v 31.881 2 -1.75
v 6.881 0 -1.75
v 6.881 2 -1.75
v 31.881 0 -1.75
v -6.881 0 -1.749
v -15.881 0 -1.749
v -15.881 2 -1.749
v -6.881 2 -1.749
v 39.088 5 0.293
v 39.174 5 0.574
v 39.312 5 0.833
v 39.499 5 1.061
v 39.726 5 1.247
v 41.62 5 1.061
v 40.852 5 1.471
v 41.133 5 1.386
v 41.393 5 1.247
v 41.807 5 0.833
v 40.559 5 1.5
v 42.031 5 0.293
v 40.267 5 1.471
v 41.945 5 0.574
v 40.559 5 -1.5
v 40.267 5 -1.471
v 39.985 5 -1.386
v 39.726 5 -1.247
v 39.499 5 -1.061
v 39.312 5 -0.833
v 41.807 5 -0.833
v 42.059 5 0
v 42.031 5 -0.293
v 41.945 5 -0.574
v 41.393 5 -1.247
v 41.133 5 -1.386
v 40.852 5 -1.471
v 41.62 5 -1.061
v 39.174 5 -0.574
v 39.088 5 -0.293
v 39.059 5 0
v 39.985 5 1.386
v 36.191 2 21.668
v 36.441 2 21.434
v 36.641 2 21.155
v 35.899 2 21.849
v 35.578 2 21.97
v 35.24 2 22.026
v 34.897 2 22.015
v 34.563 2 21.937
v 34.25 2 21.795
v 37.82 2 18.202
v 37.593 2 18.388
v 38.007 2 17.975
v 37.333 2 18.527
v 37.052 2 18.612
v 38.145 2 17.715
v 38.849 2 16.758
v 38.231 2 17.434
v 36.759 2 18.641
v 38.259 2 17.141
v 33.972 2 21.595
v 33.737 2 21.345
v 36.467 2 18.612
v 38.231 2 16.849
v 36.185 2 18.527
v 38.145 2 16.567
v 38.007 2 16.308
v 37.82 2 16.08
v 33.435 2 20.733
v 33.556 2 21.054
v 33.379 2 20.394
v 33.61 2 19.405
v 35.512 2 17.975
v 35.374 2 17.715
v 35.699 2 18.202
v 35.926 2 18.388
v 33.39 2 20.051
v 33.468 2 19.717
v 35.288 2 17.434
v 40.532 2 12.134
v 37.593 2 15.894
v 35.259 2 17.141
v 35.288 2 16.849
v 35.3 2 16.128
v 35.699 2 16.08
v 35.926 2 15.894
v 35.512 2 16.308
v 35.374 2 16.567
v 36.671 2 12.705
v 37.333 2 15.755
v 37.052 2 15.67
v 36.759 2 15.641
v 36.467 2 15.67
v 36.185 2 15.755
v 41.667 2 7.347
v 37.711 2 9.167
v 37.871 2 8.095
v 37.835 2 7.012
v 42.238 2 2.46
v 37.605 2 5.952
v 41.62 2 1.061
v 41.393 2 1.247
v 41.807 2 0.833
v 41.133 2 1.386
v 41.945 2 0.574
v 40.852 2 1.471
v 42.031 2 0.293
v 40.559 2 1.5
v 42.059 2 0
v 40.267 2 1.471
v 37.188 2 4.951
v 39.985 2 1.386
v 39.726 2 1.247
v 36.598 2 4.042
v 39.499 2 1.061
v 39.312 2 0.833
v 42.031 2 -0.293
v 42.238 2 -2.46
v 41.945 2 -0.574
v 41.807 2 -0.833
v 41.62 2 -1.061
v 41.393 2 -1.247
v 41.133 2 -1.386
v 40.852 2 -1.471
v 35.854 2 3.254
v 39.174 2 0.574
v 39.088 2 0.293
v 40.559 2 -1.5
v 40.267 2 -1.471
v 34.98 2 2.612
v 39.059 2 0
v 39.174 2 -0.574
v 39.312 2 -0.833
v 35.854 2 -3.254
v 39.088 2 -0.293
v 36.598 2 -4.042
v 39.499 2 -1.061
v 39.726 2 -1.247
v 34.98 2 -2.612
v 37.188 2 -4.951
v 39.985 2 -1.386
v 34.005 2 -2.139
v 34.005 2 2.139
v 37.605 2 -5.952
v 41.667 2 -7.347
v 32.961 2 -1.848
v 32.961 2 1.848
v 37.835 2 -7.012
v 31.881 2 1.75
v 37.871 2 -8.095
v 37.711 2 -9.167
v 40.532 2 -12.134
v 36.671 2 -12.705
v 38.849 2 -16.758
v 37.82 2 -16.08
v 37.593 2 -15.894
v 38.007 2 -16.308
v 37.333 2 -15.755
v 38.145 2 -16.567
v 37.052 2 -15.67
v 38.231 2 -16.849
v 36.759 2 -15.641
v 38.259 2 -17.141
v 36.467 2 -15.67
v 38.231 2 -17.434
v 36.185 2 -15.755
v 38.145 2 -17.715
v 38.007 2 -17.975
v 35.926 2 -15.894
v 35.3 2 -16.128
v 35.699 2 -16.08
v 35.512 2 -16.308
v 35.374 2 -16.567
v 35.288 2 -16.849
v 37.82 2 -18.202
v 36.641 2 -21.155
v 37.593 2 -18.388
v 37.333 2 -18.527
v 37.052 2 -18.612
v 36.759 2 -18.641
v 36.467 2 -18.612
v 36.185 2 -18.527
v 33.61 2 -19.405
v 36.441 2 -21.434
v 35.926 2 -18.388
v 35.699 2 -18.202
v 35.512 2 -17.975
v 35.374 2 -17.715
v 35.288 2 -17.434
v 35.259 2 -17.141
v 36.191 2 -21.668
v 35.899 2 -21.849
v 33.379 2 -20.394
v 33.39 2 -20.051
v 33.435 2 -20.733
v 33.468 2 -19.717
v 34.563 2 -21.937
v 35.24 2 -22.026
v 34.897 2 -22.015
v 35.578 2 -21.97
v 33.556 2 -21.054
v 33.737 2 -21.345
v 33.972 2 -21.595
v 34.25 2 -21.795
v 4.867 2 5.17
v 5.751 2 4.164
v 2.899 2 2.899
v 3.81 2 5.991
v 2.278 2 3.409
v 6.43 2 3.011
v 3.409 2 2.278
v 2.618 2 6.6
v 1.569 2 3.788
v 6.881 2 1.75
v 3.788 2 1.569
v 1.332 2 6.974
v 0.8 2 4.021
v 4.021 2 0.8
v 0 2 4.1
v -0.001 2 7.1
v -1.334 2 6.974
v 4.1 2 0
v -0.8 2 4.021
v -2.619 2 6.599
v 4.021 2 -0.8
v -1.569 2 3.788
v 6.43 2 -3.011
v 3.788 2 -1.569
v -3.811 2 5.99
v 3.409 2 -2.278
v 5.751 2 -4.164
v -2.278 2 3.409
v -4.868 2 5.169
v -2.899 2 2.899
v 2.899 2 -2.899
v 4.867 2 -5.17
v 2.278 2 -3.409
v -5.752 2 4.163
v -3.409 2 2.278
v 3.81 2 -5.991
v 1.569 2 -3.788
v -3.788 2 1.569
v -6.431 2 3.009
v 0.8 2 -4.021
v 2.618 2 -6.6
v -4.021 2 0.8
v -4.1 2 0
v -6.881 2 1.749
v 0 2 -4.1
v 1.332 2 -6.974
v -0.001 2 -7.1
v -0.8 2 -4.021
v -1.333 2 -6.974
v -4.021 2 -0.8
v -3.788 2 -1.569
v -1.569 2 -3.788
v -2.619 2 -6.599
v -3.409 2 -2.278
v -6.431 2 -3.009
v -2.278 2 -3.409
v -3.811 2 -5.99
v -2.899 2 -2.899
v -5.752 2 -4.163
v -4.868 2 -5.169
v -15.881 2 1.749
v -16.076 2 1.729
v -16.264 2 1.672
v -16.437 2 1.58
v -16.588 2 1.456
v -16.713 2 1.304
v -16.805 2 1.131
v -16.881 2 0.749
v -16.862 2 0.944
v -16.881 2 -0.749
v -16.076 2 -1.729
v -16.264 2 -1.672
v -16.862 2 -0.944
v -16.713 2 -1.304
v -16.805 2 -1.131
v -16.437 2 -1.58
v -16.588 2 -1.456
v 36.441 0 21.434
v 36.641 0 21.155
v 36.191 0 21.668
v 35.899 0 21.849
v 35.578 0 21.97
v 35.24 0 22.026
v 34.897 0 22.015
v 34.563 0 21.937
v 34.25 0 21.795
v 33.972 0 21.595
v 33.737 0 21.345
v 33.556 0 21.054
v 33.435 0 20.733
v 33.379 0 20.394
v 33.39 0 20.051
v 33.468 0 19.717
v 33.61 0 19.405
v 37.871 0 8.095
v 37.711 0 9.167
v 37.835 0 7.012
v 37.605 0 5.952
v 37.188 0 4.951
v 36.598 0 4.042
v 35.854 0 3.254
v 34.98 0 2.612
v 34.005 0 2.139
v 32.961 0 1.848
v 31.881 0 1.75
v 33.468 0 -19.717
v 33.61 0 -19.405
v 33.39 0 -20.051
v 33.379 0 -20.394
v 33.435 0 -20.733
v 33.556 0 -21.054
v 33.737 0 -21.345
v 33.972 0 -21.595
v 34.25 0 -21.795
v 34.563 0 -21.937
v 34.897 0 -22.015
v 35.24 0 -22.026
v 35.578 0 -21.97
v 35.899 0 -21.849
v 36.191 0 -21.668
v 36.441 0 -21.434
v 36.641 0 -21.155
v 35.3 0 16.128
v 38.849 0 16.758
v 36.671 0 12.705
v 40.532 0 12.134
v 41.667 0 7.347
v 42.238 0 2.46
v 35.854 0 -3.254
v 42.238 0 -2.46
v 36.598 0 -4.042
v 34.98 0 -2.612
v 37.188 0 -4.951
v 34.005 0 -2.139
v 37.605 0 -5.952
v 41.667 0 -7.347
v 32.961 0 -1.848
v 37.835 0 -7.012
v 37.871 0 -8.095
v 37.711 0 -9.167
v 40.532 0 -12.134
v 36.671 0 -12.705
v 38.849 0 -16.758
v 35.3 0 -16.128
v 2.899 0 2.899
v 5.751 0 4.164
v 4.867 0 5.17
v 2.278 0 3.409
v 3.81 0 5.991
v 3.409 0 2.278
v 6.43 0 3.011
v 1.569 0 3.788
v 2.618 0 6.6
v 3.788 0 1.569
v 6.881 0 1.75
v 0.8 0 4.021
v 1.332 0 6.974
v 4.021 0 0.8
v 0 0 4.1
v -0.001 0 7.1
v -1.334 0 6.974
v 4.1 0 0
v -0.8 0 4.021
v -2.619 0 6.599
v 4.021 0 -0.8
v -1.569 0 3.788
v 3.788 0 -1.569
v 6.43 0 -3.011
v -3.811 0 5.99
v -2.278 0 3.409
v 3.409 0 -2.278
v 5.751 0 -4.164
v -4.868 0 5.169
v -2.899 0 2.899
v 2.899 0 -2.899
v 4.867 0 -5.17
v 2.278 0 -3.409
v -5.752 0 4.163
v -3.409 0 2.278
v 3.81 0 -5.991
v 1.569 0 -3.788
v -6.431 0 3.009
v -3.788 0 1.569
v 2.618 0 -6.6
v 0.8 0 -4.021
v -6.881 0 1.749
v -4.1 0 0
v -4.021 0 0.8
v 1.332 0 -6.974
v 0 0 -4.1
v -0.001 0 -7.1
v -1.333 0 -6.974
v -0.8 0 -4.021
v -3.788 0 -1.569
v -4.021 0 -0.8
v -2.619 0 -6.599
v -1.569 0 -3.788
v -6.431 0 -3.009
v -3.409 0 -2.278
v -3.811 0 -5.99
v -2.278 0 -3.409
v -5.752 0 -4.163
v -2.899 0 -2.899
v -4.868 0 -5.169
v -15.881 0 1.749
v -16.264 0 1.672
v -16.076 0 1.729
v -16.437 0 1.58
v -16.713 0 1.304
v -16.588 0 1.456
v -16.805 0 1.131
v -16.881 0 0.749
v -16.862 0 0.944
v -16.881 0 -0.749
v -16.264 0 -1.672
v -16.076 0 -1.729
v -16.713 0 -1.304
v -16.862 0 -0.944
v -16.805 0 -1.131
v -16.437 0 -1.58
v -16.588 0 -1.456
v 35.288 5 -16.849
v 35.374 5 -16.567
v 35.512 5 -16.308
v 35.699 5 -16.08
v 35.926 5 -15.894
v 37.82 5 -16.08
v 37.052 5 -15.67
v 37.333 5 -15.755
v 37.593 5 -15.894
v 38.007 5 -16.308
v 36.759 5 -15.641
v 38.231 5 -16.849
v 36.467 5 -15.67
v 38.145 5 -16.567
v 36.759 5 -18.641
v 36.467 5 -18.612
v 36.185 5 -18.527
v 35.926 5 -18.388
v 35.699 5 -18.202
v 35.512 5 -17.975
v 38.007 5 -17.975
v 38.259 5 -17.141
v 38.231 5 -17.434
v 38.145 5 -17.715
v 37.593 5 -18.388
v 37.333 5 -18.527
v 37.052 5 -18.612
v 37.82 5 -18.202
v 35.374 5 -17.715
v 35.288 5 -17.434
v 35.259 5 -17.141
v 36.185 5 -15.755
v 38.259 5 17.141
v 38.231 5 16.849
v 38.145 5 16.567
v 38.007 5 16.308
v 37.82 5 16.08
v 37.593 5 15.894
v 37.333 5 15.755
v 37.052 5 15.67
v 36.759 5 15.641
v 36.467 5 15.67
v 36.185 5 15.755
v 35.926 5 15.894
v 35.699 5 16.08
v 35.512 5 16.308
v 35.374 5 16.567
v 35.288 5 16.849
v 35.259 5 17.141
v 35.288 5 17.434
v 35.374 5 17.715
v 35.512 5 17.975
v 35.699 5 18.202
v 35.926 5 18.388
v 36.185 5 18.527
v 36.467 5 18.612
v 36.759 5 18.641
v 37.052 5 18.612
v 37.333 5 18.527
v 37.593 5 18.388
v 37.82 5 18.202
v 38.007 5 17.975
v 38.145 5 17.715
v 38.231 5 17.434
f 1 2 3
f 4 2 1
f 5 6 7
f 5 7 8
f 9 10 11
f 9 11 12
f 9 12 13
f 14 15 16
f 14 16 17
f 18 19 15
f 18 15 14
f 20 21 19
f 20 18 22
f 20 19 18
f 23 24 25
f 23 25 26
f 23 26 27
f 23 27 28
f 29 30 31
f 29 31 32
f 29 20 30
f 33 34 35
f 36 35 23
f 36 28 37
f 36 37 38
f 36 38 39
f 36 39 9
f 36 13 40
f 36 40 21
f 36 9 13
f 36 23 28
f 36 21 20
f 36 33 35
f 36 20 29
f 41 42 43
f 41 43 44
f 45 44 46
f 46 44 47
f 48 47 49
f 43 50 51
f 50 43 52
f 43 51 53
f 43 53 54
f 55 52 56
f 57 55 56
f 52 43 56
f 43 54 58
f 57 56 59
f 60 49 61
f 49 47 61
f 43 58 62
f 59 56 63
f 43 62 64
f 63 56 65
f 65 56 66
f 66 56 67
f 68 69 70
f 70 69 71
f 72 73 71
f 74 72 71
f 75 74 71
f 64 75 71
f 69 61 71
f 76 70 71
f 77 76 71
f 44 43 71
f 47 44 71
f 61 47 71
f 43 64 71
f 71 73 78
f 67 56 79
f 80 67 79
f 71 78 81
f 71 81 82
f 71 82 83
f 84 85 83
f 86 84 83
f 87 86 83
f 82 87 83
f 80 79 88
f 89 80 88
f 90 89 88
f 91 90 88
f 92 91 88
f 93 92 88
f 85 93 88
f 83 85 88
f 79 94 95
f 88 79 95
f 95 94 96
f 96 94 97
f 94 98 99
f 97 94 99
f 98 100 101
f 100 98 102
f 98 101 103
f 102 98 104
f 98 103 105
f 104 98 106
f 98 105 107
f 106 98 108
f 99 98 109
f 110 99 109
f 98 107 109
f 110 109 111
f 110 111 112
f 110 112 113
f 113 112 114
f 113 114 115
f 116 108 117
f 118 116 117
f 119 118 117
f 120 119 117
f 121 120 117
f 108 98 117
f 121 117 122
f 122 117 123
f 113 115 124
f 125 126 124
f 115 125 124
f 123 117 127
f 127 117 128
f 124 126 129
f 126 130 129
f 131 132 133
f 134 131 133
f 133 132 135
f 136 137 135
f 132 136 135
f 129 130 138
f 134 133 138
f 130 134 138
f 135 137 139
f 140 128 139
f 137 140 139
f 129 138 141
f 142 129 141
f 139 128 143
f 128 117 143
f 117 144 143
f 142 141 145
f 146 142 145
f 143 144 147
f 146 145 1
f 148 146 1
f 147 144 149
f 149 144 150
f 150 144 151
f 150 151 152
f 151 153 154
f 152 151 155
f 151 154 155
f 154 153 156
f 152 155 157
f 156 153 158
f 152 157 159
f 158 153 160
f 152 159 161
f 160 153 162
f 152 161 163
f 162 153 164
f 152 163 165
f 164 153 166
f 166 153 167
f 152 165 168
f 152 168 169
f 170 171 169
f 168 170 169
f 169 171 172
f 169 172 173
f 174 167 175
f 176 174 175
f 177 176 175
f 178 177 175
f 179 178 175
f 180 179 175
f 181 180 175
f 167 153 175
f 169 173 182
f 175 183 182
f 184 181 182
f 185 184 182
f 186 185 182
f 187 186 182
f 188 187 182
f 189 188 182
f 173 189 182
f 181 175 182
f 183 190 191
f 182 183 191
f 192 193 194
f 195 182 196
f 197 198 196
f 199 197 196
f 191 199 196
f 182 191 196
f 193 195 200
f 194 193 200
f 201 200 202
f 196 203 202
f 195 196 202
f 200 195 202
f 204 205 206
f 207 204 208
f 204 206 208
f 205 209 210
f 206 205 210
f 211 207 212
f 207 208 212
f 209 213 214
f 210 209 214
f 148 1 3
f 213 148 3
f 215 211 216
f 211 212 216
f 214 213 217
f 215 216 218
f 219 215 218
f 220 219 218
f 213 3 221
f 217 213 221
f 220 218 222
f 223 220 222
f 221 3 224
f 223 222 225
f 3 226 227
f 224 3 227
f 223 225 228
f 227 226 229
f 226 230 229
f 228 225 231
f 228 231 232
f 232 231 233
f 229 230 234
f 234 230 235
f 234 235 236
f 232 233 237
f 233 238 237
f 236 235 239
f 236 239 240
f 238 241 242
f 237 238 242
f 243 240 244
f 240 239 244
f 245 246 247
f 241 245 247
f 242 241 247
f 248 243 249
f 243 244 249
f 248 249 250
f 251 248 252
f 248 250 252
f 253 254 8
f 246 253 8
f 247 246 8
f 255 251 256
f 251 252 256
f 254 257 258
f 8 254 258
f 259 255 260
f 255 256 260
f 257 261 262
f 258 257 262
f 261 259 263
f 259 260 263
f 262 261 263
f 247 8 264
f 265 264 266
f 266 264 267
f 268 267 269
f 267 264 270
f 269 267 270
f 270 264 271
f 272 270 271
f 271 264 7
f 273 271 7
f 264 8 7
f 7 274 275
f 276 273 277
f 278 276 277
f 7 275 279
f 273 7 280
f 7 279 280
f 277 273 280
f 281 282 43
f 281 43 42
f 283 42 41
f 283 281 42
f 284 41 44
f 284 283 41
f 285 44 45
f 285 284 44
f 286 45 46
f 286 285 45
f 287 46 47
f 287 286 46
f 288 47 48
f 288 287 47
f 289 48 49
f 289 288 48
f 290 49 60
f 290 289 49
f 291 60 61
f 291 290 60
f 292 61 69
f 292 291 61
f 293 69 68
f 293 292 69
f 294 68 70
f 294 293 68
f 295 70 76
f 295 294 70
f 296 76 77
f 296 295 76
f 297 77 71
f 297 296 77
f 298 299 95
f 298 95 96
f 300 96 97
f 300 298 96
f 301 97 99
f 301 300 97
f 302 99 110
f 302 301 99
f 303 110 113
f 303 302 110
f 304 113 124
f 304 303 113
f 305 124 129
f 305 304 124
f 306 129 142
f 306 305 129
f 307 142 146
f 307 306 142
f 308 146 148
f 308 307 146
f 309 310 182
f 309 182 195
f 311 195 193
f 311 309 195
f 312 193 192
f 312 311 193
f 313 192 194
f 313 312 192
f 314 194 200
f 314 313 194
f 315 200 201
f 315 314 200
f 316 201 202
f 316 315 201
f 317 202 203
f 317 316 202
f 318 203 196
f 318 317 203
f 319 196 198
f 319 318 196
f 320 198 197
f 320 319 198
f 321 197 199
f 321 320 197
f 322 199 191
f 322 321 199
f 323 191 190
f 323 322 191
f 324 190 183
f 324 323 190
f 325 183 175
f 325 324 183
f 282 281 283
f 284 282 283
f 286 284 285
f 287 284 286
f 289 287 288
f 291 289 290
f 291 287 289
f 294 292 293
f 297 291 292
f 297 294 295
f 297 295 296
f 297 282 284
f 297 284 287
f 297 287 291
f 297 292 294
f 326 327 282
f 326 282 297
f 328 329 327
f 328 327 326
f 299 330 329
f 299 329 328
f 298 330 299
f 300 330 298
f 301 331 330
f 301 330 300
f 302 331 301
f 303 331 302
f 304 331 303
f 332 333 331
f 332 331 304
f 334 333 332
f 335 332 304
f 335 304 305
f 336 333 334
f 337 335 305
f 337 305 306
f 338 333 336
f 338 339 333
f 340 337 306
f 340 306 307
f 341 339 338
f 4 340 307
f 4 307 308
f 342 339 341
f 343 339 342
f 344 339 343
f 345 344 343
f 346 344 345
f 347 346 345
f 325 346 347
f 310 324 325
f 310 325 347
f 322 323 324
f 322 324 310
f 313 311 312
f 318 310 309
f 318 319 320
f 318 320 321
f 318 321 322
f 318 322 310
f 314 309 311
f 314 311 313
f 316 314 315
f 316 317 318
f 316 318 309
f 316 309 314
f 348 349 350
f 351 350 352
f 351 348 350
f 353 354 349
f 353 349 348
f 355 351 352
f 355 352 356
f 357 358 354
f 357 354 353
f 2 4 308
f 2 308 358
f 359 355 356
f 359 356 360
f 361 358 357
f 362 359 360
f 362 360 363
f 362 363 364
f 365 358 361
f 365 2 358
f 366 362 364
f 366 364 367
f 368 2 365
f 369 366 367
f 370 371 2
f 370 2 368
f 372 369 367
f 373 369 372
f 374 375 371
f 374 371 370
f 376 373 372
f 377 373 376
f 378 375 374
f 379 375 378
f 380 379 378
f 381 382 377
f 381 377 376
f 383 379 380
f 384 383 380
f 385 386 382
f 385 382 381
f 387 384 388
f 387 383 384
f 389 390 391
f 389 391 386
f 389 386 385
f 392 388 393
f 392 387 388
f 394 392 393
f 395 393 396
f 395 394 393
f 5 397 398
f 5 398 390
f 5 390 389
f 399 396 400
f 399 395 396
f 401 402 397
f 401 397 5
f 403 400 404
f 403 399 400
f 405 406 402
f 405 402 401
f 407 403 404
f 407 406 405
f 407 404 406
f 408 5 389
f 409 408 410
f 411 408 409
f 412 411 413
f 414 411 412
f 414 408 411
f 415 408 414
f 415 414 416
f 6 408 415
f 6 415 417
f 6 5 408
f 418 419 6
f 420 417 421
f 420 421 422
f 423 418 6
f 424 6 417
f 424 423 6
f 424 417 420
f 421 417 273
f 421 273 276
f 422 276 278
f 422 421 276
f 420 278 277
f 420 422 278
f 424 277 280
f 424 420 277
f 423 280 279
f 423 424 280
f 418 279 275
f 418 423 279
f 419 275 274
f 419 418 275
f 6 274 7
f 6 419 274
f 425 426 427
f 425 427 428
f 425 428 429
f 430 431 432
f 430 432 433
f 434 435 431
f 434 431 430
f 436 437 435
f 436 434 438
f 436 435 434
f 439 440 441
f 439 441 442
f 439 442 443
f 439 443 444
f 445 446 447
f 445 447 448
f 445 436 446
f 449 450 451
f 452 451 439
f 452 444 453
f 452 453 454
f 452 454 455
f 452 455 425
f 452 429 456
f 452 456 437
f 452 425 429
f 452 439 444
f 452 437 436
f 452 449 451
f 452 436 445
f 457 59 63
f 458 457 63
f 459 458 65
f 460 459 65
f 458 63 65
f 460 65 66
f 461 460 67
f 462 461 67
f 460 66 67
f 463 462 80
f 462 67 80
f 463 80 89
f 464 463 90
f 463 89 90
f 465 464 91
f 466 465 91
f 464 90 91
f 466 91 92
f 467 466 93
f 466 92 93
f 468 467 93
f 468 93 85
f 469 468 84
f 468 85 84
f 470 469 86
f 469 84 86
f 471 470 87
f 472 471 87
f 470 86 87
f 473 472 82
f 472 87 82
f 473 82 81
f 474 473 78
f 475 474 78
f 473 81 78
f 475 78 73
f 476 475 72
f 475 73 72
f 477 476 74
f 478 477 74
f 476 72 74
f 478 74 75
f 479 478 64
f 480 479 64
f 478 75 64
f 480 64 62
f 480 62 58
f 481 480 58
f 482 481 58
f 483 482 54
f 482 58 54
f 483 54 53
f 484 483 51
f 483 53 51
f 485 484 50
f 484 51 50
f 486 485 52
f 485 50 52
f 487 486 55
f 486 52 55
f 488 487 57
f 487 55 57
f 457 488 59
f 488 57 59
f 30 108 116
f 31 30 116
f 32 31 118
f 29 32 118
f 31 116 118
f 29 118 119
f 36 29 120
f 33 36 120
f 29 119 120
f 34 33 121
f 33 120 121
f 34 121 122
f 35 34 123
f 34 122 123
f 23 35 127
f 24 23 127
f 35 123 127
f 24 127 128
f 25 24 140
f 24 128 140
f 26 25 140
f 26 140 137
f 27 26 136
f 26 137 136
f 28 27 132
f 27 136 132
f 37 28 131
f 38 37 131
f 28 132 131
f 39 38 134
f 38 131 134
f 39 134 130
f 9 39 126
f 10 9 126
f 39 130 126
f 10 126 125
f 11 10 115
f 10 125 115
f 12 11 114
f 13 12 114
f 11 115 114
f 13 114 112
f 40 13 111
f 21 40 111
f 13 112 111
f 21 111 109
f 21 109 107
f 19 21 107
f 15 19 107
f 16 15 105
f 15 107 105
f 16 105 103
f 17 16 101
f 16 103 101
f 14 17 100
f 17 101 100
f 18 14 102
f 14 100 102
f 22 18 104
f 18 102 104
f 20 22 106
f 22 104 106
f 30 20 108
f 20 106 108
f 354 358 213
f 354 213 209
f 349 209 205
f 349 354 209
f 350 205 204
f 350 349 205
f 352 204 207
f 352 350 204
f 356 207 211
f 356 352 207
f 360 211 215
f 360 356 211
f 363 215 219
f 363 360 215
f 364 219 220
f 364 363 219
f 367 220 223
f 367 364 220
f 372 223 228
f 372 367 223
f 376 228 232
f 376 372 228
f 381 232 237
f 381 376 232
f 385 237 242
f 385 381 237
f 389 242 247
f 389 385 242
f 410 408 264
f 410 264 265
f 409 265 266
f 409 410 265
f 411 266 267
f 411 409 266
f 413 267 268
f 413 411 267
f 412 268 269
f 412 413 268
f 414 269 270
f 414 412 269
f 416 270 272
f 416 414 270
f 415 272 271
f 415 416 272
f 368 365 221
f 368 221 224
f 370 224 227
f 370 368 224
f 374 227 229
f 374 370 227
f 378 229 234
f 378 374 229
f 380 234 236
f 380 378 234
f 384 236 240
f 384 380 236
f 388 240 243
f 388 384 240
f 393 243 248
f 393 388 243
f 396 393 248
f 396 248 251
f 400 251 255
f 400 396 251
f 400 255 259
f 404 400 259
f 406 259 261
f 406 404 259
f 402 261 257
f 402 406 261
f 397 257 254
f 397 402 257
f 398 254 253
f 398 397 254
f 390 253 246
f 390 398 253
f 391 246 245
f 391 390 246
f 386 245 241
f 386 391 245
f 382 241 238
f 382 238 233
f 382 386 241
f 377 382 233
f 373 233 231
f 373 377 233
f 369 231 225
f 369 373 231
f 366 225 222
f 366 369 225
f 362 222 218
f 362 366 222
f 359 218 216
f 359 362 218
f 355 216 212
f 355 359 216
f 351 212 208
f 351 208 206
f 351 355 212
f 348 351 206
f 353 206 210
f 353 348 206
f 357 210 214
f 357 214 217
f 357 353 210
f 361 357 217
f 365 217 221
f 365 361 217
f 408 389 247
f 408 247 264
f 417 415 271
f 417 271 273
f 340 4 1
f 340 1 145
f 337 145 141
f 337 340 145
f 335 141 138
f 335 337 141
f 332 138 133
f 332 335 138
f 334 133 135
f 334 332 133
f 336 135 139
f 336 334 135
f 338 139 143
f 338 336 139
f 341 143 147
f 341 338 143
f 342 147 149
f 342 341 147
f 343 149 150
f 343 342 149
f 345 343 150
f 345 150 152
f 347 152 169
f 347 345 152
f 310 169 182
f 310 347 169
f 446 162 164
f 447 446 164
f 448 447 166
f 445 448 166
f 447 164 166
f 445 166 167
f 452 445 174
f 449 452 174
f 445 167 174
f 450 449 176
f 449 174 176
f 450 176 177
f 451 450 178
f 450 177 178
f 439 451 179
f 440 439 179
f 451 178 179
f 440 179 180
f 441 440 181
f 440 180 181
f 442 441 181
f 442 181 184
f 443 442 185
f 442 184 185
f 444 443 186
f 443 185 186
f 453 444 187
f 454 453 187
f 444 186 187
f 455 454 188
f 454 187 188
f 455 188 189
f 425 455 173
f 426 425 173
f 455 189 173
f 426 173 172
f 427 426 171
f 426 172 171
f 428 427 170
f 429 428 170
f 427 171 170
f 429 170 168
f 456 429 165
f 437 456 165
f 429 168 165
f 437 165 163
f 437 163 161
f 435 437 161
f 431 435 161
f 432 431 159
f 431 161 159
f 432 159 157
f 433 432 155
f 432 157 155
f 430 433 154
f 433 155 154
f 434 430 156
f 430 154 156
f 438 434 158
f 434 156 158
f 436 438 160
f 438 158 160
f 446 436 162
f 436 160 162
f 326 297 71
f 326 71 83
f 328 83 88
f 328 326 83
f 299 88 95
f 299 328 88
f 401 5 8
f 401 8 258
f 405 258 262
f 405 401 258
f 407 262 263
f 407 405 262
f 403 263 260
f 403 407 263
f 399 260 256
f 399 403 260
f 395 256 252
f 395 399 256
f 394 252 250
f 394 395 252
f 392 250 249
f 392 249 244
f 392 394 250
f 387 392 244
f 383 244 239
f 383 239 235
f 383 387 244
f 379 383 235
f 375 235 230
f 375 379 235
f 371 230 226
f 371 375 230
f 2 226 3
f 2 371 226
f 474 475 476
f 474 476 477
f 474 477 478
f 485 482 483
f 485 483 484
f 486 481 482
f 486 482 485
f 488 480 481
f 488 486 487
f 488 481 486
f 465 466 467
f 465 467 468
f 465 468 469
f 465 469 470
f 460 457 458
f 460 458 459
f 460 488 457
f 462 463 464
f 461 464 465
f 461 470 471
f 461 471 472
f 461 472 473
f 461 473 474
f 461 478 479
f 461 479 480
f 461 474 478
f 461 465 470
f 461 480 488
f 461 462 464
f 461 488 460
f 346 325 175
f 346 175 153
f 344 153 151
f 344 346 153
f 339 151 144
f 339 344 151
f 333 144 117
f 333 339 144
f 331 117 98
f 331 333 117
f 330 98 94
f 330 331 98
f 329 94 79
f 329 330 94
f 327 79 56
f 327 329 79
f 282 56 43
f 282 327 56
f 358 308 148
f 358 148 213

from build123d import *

# Parameters (mm, degrees)
SKETCH1_R           = 4.1
BOSS_EXTRUDE1_DEPTH = 2
SKETCH2_R           = 1.5
BOSS_EXTRUDE2_DEPTH = 3


with BuildPart() as part:
    # Sketch1 → Boss-Extrude1 (new body)
    with BuildSketch(Plane(origin=(0, 0, 0), x_dir=(1, 0, 0), z_dir=(0, 1, 0))):
        with BuildLine():
            Line((6.880964228, 1.749997239), (31.880964166, 1.749997239))
            ThreePointArc((31.880964166, 1.749997239), (36.598148239, 4.042144166), (37.711172654, 9.167272434))
            ThreePointArc((37.711172654, 9.167272434), (36.026057764, 14.43241452), (33.609947488, 19.40471223))
            ThreePointArc((33.609947488, 19.40471223), (34.250491945, 21.795256686), (36.641036401, 21.15471223))
            ThreePointArc((36.641036401, 21.15471223), (42.309424459, 0), (36.641036401, -21.15471223))
            ThreePointArc((36.641036401, -21.15471223), (34.250491945, -21.795256686), (33.609947488, -19.40471223))
            ThreePointArc((33.609947488, -19.40471223), (36.026056514, -14.432417639), (37.711171067, -9.167278965))
            ThreePointArc((37.711171067, -9.167278965), (36.598147218, -4.042150095), (31.880962823, -1.750002761))
            Line((31.880962823, -1.750002761), (6.880962823, -1.750002761))
            ThreePointArc((6.880962823, -1.750002761), (-0.000729594, -7.100011163), (-6.881322337, -1.748588554))
            Line((-6.881322337, -1.748588554), (-15.881322337, -1.748588554))
            ThreePointArc((-15.881322337, -1.748588554), (-16.588429118, -1.455695335), (-16.881322337, -0.748588554))
            Line((-16.881322337, -0.748588554), (-16.881322337, 0.748588554))
            ThreePointArc((-16.881322337, 0.748588554), (-16.588429118, 1.455695335), (-15.881322337, 1.748588554))
            Line((-15.881322337, 1.748588554), (-6.881322337, 1.748588554))
            ThreePointArc((-6.881322337, 1.748588554), (-0.000726746, 7.100011163), (6.880964228, 1.749997239))
        make_face()
        Circle(SKETCH1_R, mode=Mode.SUBTRACT)
    extrude(amount=BOSS_EXTRUDE1_DEPTH)

    # Sketch2 → Boss-Extrude2 (add)
    with BuildSketch(Plane(origin=(0, 2, 0), x_dir=(1, 0, 0), z_dir=(0, 1, 0))):
        with Locations((36.759322225, 17.141153462)):
            Circle(SKETCH2_R)
        with Locations((40.559424459, 0)):
            Circle(SKETCH2_R)
        with Locations((36.759322225, -17.141153462)):
            Circle(SKETCH2_R)
    extrude(amount=BOSS_EXTRUDE2_DEPTH)


solid = part.part
